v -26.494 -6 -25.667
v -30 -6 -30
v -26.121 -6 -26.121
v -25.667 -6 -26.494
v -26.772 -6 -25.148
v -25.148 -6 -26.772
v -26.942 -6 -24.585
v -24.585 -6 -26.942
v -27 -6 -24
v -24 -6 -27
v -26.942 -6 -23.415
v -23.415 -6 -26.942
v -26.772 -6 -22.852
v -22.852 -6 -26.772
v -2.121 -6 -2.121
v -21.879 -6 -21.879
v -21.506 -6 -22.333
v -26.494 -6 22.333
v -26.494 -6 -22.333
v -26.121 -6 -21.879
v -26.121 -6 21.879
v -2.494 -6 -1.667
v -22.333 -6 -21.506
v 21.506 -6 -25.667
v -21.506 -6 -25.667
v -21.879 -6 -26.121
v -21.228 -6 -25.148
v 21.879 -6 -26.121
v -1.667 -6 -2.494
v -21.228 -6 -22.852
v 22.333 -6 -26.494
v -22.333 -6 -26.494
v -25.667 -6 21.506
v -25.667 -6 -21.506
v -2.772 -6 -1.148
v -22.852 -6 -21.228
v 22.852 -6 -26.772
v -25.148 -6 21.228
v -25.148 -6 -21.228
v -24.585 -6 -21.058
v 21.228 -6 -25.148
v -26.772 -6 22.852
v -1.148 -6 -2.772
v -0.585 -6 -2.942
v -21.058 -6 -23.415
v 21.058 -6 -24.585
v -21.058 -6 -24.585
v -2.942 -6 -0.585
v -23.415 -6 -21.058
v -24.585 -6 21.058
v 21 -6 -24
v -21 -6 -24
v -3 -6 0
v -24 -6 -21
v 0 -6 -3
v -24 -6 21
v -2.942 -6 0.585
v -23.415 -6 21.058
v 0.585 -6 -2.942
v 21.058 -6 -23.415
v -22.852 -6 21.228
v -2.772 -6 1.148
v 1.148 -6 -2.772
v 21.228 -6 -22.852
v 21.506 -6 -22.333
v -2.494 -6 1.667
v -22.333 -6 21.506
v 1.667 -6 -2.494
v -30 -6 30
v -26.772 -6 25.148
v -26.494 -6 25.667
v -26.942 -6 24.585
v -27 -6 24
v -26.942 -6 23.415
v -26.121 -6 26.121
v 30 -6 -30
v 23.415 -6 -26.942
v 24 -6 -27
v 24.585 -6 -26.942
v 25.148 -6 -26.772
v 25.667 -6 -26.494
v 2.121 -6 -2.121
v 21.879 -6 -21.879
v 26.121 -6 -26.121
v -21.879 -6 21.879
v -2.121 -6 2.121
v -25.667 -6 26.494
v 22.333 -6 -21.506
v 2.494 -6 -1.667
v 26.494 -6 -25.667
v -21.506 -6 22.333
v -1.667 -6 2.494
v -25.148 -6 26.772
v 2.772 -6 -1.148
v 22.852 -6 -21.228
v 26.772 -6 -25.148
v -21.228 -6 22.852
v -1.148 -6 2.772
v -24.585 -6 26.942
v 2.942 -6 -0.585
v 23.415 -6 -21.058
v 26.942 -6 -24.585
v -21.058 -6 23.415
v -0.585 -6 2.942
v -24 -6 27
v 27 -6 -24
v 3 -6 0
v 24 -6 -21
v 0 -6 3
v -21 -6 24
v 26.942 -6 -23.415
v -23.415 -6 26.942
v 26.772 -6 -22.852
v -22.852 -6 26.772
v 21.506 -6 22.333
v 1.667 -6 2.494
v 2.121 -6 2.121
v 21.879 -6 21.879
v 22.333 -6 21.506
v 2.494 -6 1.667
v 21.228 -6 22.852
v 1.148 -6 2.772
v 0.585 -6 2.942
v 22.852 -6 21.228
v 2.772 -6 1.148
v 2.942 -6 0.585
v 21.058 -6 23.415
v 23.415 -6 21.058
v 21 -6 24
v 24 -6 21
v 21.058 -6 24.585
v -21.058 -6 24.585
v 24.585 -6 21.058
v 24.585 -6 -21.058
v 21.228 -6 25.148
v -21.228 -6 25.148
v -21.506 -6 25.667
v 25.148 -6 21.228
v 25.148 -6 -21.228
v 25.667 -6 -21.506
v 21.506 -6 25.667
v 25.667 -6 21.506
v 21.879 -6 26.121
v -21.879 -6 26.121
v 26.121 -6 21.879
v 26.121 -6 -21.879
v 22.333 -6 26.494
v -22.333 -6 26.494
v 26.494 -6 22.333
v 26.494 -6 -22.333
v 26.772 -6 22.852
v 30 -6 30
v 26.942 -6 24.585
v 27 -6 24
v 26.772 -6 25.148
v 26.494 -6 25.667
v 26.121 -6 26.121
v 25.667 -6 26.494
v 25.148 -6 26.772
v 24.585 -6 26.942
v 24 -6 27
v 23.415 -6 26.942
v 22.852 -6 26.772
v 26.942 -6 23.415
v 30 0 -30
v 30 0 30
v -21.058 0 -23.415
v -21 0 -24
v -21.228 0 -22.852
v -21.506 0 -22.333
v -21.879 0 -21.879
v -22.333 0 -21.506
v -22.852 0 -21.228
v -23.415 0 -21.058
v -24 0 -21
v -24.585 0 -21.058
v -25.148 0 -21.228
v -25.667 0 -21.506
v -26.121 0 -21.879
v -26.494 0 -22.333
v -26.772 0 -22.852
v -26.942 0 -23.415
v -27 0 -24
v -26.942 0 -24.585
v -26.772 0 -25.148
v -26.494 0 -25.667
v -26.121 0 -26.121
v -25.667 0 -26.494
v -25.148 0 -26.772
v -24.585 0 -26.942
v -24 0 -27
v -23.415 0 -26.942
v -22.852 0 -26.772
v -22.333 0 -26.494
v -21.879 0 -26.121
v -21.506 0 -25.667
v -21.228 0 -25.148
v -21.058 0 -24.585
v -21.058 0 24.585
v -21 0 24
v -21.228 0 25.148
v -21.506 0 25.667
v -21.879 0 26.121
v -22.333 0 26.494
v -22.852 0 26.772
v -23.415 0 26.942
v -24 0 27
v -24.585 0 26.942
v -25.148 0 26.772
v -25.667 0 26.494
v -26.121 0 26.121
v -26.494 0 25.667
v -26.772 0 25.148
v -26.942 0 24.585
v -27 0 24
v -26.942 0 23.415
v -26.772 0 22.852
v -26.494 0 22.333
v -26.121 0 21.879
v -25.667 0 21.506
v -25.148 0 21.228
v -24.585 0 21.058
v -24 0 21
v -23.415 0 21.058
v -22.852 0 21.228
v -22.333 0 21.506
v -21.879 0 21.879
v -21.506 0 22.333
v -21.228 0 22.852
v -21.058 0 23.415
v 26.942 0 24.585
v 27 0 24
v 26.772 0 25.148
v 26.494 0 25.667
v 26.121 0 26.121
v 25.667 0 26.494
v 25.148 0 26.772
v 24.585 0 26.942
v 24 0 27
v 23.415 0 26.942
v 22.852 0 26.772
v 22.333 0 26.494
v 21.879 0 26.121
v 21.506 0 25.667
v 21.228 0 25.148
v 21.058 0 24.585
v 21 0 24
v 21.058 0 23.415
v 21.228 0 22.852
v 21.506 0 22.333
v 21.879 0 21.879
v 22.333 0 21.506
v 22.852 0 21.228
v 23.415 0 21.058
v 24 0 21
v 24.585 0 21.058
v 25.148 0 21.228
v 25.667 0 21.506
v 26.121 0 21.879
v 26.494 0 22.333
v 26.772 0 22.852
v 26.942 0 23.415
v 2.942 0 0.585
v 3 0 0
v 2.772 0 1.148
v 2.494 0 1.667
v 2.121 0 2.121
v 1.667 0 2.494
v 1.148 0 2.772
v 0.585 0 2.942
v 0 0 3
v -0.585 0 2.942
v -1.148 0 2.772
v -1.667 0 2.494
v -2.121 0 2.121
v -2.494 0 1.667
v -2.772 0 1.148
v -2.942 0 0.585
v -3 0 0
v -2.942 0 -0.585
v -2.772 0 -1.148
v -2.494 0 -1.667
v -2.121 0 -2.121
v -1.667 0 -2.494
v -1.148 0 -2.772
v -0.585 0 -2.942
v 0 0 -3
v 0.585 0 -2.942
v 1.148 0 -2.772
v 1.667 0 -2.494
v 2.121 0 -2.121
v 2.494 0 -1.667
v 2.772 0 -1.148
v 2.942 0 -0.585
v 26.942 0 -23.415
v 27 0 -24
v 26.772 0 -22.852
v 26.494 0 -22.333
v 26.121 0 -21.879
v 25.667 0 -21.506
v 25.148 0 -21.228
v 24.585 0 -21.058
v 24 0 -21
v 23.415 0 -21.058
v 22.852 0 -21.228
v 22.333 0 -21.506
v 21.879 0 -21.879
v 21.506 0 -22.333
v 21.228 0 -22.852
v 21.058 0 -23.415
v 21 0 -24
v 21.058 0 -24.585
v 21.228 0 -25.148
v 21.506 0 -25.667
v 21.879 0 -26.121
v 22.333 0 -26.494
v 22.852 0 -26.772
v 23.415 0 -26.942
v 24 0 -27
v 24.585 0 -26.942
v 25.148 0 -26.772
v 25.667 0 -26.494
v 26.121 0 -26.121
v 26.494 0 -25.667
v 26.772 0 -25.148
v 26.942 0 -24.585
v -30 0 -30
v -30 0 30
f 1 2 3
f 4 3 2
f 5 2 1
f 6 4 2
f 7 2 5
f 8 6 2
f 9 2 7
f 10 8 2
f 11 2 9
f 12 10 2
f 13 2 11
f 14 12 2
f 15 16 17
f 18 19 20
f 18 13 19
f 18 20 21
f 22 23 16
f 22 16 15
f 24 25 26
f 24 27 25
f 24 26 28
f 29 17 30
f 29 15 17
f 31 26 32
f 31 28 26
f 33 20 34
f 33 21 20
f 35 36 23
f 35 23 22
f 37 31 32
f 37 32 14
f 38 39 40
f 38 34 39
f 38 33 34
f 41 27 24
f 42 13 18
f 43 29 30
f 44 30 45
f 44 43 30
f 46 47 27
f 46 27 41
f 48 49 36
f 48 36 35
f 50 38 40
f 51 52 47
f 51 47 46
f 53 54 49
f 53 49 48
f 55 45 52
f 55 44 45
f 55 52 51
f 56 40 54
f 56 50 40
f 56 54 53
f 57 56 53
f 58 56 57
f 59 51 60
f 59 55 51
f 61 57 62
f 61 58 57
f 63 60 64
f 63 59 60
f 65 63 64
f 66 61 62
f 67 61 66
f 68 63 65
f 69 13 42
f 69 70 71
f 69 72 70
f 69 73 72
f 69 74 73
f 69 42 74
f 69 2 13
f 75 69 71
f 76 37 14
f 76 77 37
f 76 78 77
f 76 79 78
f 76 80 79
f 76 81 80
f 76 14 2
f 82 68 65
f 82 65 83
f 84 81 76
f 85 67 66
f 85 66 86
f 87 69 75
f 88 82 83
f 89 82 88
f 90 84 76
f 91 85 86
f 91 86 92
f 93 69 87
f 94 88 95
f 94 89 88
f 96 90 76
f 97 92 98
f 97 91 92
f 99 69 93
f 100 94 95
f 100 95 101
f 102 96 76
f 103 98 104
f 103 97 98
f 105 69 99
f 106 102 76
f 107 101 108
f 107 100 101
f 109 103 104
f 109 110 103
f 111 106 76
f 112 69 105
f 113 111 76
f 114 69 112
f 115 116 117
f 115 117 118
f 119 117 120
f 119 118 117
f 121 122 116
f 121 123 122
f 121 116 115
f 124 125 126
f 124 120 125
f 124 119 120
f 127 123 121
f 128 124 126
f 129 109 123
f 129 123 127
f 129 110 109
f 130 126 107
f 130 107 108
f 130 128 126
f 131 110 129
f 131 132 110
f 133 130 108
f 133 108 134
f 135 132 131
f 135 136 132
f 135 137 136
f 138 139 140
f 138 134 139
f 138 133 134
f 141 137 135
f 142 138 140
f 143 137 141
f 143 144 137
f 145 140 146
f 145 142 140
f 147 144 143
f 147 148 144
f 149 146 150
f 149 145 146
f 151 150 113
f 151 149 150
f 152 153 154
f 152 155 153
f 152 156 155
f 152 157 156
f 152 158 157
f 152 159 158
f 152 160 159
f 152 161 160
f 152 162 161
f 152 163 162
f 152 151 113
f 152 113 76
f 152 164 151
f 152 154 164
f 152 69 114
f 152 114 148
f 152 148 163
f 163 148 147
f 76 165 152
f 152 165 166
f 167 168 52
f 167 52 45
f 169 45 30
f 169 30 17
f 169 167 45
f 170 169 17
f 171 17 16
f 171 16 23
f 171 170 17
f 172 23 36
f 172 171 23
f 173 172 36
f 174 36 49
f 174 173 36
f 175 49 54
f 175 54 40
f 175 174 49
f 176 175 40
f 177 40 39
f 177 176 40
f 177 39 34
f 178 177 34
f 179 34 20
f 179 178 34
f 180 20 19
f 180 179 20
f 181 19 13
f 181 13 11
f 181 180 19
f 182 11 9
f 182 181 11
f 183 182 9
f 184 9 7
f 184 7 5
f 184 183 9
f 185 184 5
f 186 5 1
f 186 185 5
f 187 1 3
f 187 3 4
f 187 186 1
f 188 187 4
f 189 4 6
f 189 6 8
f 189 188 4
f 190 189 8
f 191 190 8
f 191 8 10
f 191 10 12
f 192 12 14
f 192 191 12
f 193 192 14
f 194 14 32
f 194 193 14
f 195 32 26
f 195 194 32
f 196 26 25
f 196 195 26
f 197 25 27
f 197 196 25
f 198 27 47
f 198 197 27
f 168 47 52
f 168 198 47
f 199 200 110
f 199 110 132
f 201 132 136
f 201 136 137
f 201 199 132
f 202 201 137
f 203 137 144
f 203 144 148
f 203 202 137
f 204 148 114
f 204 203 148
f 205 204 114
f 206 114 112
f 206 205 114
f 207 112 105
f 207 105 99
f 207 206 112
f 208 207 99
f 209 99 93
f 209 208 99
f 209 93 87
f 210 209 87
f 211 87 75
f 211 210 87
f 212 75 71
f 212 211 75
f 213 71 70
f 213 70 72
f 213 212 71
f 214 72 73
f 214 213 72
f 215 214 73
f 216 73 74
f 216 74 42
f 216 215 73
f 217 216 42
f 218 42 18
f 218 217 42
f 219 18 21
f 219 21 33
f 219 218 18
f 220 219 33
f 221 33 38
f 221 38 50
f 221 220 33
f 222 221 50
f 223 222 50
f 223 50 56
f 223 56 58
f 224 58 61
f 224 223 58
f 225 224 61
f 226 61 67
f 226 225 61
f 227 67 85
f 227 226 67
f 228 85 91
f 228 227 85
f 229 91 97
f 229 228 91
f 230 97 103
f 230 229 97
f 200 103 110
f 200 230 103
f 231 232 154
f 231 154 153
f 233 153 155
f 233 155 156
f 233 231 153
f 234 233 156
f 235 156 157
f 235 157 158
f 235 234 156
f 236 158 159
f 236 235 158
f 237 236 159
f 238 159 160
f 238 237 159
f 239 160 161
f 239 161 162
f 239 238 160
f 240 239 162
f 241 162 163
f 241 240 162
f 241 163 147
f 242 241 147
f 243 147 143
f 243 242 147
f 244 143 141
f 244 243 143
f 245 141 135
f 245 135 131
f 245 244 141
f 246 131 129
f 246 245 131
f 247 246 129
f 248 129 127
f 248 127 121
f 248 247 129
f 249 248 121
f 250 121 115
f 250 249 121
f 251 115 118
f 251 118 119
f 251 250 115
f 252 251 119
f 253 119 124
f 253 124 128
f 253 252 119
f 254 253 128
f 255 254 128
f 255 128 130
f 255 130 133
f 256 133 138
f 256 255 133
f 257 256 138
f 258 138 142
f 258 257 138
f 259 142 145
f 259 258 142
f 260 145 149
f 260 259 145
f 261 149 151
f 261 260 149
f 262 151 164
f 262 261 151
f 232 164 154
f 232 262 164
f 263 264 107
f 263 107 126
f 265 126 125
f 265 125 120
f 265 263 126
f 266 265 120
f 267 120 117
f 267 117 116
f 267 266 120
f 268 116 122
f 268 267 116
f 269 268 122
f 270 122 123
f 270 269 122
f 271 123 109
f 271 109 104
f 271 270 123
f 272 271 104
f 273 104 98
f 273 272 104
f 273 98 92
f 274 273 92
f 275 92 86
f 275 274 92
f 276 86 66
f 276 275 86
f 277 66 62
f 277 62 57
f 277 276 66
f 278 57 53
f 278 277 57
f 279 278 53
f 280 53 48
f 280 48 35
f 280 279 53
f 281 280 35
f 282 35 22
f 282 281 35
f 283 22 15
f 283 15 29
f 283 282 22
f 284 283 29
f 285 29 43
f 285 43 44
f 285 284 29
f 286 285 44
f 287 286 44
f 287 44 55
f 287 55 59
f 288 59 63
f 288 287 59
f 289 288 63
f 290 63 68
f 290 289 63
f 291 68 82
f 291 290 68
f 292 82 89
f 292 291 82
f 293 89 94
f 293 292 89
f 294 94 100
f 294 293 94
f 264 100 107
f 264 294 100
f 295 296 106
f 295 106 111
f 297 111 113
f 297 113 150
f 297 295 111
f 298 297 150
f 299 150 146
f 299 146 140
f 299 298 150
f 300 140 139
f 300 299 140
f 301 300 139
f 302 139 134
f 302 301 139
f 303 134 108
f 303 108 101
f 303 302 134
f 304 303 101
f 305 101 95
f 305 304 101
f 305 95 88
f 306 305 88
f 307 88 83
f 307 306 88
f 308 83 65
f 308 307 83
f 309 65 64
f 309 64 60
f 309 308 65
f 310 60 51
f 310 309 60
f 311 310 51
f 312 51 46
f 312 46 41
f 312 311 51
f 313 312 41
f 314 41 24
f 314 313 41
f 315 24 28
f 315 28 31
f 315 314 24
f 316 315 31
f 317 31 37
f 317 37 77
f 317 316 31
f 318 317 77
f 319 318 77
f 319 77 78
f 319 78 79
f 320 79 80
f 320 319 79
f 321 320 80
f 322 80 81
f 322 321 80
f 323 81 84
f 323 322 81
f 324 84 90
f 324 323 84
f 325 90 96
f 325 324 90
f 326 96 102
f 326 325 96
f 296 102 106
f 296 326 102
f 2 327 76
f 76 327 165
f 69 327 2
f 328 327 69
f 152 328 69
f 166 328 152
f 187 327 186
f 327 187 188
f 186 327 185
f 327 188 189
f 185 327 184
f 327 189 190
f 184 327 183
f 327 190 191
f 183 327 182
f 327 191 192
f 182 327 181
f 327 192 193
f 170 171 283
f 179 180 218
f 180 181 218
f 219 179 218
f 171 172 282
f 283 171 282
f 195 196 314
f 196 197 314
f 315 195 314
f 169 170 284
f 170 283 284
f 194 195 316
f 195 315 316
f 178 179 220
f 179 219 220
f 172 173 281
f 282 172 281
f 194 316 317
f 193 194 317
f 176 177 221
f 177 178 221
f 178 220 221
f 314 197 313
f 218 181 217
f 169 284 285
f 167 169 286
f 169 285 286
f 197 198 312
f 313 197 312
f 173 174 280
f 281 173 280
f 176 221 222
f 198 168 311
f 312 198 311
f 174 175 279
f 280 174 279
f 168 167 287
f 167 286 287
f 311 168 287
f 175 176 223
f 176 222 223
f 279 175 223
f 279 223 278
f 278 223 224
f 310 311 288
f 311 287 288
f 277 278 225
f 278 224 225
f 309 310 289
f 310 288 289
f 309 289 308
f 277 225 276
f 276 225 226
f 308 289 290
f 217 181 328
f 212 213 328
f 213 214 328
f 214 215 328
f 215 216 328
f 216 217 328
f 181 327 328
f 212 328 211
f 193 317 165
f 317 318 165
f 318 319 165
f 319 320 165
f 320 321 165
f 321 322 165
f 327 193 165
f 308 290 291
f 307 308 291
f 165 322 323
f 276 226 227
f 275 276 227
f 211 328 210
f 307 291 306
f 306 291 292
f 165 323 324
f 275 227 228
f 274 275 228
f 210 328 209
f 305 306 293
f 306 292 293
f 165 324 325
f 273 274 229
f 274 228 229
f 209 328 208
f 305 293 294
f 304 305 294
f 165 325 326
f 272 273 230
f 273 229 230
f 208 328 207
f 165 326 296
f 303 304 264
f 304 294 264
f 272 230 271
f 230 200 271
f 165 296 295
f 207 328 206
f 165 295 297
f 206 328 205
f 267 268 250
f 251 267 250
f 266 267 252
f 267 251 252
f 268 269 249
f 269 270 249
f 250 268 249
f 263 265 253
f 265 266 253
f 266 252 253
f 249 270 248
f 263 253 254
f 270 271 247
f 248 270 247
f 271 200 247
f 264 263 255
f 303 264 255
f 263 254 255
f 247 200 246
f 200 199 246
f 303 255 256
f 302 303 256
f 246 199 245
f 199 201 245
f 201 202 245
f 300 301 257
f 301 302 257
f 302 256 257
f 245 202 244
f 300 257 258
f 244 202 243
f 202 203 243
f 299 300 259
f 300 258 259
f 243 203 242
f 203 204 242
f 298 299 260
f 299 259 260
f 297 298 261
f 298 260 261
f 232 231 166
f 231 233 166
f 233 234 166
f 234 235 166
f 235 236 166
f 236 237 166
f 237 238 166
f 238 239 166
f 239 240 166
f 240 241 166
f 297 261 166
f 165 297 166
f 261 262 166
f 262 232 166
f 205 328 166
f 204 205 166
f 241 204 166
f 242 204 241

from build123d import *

# Parameters (mm, degrees)
F0_W     = 60
F0_H     = 60
F0_R     = 3
F1_DEPTH = 6


with BuildPart() as f1:
    # F0 (on Front) → F1 (new body)
    with BuildSketch(Plane.XZ):
        Rectangle(F0_W, F0_H)
        with Locations((-24, -24)):
            Circle(F0_R, mode=Mode.SUBTRACT)
        with Locations((24, -24)):
            Circle(F0_R, mode=Mode.SUBTRACT)
        with Locations((-24, 24)):
            Circle(F0_R, mode=Mode.SUBTRACT)
        Circle(F0_R, mode=Mode.SUBTRACT)
        with Locations((24, 24)):
            Circle(F0_R, mode=Mode.SUBTRACT)
    extrude(amount=F1_DEPTH)


solid = f1.part
